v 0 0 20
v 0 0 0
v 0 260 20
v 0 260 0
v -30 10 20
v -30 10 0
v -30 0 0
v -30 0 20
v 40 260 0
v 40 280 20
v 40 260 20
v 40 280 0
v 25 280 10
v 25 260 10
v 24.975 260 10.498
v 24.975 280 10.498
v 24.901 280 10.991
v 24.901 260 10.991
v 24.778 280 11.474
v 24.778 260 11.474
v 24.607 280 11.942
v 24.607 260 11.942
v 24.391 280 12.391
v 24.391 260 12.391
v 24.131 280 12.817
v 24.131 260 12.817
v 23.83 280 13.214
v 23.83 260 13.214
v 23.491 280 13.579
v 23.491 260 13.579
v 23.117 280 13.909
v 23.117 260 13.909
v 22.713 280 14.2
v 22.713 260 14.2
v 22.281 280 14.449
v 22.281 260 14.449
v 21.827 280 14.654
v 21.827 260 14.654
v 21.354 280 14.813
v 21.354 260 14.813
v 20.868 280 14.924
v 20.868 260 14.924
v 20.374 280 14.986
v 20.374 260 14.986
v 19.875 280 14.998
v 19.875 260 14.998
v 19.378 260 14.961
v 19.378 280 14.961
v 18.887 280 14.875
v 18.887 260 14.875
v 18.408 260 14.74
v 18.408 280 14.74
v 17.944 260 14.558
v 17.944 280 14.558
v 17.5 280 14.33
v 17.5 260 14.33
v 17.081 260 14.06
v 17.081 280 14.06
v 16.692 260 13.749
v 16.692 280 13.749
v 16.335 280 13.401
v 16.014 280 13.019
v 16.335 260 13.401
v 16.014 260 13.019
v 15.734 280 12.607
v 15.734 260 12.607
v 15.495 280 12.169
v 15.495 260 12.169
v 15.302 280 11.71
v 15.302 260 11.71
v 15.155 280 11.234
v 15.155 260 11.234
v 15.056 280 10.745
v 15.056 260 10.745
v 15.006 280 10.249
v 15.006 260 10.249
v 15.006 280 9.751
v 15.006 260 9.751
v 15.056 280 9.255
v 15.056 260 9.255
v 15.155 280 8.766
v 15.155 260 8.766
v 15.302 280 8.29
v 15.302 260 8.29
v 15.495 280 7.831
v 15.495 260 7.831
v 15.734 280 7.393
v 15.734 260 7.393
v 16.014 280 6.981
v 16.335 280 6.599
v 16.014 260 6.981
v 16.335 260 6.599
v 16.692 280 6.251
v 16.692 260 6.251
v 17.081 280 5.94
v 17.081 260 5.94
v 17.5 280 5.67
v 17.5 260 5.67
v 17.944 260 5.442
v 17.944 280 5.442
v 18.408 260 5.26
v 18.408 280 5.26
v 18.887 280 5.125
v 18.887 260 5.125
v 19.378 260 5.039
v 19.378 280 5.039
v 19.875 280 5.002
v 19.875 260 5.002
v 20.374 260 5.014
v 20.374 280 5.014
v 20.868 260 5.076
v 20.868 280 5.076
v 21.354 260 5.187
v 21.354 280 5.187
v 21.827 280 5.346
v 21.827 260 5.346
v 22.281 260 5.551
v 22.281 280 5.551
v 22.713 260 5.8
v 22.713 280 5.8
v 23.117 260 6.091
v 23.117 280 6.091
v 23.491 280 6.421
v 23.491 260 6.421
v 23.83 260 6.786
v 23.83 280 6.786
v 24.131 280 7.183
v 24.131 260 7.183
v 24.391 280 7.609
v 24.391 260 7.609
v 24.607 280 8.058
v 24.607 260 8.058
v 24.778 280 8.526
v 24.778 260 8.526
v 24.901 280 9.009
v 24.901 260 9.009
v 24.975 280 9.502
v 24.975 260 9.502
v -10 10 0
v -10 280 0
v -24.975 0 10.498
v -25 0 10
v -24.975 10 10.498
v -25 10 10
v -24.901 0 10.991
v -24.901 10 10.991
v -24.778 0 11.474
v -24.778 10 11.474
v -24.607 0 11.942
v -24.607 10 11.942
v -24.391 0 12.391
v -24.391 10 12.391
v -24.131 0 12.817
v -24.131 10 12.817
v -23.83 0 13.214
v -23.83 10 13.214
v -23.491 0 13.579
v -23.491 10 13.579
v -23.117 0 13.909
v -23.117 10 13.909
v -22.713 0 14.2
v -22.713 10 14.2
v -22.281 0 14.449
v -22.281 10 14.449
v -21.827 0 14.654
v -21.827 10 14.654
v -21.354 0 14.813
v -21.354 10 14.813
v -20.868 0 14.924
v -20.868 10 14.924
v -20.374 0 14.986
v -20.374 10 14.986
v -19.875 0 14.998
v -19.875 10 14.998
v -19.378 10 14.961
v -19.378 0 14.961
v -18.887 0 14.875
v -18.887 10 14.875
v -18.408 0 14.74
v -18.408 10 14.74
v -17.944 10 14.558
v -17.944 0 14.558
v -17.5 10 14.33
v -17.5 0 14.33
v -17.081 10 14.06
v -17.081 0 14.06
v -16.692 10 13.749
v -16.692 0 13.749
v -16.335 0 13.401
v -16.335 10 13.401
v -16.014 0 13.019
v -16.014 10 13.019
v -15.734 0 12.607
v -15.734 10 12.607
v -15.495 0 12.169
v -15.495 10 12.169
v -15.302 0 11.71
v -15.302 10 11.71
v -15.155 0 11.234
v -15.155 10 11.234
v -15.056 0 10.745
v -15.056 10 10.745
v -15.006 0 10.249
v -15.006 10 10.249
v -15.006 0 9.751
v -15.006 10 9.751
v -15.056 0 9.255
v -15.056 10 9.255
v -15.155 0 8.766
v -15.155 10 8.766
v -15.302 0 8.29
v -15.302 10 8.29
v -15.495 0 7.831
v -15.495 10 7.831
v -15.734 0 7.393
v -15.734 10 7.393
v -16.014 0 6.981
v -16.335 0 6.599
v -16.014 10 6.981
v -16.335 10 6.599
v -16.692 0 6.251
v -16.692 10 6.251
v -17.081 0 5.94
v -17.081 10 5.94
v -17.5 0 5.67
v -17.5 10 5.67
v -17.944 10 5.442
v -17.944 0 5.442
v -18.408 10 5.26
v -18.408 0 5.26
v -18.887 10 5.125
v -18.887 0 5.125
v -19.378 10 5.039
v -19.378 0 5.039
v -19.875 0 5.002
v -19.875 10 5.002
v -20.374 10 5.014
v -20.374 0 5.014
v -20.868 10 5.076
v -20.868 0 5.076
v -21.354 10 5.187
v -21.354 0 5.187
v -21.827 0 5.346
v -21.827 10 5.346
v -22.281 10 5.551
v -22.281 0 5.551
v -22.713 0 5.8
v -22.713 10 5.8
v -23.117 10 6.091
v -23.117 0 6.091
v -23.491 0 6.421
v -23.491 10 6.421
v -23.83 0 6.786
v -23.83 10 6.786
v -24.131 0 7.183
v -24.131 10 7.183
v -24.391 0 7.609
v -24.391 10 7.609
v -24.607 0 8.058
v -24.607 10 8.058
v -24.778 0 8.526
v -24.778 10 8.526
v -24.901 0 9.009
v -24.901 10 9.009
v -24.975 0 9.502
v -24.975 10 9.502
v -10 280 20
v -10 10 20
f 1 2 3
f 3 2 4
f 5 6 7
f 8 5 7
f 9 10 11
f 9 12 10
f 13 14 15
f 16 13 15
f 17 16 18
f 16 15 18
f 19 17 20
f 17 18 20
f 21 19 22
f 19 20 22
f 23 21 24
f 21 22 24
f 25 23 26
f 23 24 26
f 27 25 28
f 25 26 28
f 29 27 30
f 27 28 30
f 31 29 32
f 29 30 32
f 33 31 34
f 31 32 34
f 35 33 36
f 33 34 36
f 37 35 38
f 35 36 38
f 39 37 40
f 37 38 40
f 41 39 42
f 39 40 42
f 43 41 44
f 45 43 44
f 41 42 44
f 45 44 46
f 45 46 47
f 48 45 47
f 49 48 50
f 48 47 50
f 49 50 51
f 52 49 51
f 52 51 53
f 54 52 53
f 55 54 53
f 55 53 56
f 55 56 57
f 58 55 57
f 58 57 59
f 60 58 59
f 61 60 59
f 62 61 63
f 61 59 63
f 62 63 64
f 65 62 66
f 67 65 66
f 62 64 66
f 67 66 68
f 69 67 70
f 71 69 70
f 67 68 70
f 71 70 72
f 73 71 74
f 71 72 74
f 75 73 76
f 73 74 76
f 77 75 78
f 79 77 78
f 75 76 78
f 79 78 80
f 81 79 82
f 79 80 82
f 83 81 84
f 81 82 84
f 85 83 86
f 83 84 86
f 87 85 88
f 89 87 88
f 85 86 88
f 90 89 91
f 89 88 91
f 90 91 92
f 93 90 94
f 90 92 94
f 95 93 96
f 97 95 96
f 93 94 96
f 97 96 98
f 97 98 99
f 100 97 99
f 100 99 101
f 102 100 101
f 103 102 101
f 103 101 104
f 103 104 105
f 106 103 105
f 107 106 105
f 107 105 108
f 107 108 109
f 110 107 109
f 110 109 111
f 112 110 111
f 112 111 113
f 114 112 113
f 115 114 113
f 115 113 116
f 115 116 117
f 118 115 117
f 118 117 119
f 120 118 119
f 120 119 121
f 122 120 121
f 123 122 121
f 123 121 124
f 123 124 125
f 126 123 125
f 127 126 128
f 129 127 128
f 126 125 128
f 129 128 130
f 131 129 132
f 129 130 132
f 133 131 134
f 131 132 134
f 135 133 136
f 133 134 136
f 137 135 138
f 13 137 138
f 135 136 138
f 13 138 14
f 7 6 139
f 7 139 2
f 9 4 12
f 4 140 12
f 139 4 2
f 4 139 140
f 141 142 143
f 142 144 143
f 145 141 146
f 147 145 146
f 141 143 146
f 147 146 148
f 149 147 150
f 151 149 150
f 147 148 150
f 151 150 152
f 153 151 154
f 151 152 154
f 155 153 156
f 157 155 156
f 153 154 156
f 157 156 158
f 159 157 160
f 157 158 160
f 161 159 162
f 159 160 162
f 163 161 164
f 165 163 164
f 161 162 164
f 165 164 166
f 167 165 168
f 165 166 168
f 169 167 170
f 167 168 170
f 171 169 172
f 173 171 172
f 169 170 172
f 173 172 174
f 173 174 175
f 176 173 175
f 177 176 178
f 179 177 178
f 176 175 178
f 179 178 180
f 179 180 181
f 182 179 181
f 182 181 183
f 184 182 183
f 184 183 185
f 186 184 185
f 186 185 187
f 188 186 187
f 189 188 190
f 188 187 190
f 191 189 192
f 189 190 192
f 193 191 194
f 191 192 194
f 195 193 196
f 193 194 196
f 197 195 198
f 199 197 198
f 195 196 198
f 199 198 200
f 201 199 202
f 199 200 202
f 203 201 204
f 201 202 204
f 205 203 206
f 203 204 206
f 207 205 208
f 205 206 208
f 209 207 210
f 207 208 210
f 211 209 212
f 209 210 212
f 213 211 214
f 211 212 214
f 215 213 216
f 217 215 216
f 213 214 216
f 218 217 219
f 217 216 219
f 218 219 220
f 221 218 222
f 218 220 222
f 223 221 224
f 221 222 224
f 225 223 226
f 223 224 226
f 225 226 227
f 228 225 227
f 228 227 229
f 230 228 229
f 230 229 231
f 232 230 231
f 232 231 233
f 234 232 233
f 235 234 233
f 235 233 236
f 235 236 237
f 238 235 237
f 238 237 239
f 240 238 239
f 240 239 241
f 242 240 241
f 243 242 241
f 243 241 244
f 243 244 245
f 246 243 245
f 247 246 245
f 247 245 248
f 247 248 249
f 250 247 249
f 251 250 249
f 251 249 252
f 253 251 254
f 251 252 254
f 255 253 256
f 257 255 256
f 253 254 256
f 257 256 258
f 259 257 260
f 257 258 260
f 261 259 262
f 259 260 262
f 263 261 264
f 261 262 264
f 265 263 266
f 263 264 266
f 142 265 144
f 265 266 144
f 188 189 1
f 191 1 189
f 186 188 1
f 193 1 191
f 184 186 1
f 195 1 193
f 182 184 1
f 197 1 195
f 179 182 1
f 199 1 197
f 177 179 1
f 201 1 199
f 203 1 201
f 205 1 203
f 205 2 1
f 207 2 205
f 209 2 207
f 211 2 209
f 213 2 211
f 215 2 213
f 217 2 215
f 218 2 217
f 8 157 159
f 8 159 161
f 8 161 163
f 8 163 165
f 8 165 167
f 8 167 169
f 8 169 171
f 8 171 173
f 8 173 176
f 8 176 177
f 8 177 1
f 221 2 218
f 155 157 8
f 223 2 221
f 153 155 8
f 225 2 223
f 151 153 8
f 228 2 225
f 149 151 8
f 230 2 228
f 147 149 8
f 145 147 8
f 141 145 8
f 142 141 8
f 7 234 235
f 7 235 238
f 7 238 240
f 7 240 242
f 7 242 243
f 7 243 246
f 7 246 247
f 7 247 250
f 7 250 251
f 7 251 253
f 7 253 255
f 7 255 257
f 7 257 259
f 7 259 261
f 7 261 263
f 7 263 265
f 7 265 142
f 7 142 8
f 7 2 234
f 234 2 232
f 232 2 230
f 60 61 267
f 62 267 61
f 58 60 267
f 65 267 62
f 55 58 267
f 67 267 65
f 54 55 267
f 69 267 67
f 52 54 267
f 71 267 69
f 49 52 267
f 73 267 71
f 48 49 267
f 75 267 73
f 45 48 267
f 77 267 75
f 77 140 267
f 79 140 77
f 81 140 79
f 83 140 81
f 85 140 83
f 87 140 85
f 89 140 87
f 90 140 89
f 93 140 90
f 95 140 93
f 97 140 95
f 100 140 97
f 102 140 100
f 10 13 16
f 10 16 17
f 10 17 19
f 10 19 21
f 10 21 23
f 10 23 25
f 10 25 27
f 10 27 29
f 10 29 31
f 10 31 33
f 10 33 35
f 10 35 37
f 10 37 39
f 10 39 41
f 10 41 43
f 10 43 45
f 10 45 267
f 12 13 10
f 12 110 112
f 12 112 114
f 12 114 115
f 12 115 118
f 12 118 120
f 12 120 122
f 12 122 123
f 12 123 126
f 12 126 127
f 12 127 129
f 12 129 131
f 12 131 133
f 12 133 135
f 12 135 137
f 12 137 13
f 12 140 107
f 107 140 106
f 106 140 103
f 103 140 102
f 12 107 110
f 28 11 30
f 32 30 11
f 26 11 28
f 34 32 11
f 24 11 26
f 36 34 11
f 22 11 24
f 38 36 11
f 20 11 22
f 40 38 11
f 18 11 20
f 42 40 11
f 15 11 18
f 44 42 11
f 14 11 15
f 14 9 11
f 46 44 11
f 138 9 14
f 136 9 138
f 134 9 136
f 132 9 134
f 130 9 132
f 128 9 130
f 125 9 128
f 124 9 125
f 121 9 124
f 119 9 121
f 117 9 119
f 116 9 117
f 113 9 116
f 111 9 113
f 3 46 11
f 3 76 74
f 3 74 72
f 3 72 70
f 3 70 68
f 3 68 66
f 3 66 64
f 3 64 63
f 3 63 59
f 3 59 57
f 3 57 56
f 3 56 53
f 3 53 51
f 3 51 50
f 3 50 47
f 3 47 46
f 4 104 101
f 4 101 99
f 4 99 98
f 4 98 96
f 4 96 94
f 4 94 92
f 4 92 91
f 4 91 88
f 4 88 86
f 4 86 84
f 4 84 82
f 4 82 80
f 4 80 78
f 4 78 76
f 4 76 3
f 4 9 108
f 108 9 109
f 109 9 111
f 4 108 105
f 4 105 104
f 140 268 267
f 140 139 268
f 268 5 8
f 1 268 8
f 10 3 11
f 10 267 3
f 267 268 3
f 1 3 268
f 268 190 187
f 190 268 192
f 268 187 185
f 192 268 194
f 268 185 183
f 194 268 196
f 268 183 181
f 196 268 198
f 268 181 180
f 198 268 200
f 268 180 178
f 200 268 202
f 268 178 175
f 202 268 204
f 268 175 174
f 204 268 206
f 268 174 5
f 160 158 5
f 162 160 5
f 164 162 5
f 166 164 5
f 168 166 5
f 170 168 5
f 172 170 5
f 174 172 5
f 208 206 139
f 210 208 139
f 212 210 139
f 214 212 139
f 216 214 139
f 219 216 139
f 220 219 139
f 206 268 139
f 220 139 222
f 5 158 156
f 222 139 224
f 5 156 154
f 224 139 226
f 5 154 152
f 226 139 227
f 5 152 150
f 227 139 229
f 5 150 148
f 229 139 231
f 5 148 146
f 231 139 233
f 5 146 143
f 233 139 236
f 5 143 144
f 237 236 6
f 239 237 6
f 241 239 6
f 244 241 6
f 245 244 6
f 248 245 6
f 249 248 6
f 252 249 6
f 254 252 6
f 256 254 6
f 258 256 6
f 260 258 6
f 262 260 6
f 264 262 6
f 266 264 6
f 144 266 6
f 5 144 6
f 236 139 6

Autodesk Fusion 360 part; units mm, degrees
sketch "Sketch1" plane through (0, 0, 0) normal (0, 0, 1) x (1, 0, 0)
  line L0 (0, 0) -> (0, 260)
  line L1 (0, 0) -> (-30, 0)
  line L2 (-30, 0) -> (0, 0)
  line L3 (0, 0) -> (0, 10)
  line L4 (0, 10) -> (-30, 10)
  line L5 (-30, 10) -> (-30, 0)
  line L6 (0, 10) -> (-10, 10)
  line L7 (-10, 10) -> (-10, 280)
  line L8 (-10, 280) -> (40, 280)
  line L9 (40, 280) -> (40, 260)
  line L10 (40, 260) -> (-10, 260)
  line L11 (-10, 260) -> (-10, 280)
  dimension "d1" = 260
  dimension "d2" = 30
  dimension "d3" = 10
  dimension "d4" = 270
  dimension "d5" = 50
  dimension "d6" = 20
extrude "Extrude1" add sketch "Sketch1" along normal blind 20
sketch "Sketch2" plane through (0, 260, 0) normal (0, -1, 0) x (1, 0, 0)
  line L0 (0, 0) -> (40, 0)
  line L1 (40, 0) -> (40, 20)
  line L2 (40, 20) -> (0, 20)
  line L3 (0, 20) -> (0, 0)
  line L4 (20, 20) -> (20, 10)
  circle A0 centre (20, 10) radius 5
  dimension "d9" = 10
sketch "Sketch3" plane through (0, 10, 0) normal (0, 1, 0) x (-1, 0, 0)
  line L0 (10, 0) -> (30, 0)
  line L1 (30, 0) -> (30, 20)
  line L2 (30, 20) -> (10, 20)
  line L3 (10, 20) -> (10, 0)
  circle A0 centre (20, 10) radius 5
  dimension "d10" = 10
extrude "Extrude2" cut sketch "Sketch3" against normal blind 25 contours A0
extrude "Extrude3" cut sketch "Sketch2" against normal blind 100 contours A0
